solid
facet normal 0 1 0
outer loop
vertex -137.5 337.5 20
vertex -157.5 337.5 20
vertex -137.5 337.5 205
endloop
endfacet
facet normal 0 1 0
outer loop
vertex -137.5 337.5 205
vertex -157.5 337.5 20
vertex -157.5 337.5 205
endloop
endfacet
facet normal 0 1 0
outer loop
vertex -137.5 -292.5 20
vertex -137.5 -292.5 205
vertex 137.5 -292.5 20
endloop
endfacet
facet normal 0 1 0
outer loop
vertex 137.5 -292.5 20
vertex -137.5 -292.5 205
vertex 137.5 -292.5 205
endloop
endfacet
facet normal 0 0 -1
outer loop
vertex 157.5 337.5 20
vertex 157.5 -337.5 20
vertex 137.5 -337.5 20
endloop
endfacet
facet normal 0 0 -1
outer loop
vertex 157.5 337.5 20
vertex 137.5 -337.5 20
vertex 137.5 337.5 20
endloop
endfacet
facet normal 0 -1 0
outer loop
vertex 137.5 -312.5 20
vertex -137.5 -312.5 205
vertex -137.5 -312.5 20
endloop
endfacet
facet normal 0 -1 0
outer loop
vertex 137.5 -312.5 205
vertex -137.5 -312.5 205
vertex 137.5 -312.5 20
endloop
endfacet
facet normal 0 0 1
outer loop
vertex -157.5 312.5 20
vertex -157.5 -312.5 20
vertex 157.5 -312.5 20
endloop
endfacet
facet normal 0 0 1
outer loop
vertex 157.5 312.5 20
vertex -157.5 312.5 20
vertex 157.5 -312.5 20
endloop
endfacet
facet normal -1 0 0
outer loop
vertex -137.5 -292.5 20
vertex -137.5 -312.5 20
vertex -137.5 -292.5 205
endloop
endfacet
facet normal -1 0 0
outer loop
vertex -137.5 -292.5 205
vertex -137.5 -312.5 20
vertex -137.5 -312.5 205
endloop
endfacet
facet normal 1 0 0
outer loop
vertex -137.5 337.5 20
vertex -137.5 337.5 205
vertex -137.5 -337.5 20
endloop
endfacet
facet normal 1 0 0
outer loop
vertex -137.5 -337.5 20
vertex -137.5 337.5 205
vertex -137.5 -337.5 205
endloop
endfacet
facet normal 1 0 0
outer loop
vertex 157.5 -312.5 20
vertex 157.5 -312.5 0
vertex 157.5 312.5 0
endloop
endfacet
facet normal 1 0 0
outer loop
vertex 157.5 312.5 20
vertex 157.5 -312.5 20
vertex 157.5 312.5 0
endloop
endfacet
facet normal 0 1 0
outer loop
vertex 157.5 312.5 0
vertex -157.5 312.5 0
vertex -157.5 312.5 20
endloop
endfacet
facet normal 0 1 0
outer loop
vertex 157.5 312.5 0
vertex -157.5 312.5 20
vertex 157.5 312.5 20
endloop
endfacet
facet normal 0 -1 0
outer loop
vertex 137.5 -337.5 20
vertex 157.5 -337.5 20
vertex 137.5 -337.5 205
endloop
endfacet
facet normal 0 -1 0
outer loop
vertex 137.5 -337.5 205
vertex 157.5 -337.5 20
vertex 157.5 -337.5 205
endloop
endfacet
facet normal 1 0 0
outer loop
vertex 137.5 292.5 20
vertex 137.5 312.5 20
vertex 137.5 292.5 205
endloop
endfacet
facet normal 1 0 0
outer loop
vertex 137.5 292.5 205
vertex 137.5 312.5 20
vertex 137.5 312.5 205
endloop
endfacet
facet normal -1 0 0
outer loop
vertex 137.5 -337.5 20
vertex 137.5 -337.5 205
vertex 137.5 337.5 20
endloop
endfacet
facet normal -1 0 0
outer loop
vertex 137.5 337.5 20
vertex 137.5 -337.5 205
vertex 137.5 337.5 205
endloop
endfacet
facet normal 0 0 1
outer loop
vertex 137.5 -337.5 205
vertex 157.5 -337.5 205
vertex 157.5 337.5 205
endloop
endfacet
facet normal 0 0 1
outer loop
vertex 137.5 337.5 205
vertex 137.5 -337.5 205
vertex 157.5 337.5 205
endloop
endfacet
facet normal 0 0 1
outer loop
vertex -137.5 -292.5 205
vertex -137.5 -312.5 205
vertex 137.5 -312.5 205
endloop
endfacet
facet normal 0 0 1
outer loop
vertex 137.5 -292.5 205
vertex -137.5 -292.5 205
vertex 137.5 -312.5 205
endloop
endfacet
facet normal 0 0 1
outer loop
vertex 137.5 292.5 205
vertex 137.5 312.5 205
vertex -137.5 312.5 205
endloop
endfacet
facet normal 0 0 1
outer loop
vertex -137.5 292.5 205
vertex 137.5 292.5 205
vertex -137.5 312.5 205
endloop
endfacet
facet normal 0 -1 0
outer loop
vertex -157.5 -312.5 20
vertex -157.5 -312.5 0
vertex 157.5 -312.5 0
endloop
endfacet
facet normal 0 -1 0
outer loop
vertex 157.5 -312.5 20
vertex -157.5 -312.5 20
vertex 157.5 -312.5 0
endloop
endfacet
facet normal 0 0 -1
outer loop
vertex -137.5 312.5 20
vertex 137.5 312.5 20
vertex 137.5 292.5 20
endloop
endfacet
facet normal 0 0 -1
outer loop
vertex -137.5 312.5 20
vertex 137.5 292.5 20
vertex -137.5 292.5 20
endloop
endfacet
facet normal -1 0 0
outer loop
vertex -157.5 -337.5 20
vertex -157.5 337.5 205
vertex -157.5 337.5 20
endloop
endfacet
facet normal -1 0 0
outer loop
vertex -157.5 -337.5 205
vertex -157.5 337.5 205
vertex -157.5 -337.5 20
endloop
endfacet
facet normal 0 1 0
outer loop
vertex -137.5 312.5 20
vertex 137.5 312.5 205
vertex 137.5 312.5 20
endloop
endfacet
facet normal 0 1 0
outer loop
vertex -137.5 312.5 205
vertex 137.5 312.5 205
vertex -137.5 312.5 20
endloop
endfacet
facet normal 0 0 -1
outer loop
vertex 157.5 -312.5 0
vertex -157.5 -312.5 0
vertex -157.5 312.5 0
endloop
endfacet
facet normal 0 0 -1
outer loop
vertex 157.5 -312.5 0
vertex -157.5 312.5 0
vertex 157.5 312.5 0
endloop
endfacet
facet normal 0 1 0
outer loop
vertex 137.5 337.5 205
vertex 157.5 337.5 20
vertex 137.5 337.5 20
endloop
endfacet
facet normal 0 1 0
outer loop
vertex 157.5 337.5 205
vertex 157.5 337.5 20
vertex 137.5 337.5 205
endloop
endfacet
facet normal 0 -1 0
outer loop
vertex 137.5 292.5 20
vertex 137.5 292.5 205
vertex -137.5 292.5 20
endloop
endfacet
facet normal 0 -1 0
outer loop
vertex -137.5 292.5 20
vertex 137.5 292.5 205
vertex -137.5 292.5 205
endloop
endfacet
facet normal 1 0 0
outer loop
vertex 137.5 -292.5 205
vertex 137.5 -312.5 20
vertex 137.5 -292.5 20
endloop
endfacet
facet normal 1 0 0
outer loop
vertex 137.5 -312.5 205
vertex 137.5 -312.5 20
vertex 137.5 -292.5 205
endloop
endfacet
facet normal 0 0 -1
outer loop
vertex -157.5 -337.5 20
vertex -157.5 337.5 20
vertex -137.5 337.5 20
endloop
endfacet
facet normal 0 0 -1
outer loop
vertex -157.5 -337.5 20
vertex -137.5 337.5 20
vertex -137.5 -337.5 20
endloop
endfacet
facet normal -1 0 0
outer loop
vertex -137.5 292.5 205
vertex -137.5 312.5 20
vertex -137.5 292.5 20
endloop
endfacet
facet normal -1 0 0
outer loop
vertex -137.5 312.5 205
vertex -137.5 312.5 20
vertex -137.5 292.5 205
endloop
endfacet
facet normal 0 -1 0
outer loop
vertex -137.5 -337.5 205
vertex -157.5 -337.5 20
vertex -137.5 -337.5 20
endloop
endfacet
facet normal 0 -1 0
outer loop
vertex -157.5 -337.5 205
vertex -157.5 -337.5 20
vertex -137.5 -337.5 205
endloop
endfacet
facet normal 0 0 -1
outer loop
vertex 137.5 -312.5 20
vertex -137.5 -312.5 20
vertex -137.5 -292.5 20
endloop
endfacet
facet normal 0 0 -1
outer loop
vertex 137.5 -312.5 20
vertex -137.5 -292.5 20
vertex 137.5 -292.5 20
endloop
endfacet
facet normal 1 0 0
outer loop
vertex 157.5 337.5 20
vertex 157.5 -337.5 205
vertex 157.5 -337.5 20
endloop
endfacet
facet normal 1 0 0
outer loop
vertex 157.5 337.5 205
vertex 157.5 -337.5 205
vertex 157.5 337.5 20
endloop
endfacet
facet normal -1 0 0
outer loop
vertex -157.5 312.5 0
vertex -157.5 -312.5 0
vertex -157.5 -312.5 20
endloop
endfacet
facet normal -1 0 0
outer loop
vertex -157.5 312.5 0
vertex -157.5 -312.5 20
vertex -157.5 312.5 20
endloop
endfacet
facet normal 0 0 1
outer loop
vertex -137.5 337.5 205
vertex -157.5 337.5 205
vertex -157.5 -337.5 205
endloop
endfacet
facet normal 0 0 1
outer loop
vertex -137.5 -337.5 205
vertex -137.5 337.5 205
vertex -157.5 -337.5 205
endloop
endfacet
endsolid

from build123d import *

# Parameters (mm, degrees)
F0_W     = 315
F0_H     = 625
F1_DEPTH = 20
F2_W     = 675
F2_H     = 185
F3_DEPTH = 20
F4_W     = 675
F4_H     = 185
F5_DEPTH = 20
F6_W     = 275
F6_H     = 185
F7_DEPTH = 20
F8_W     = 275
F8_H     = 185
F9_DEPTH = 20


with BuildPart() as f1:
    # F0 (on Top) → F1 (new body)
    with BuildSketch(Plane.XY):
        Rectangle(F0_W, F0_H)
    extrude(amount=F1_DEPTH)


with BuildPart() as f3:
    # F2 (on face) → F3 (new body)
    with BuildSketch(Plane.YZ.offset(157.5)):
        with Locations((0, 112.5)):
            Rectangle(F2_W, F2_H)
    extrude(amount=-F3_DEPTH)


with BuildPart() as f5:
    # F4 (on face) → F5 (new body)
    with BuildSketch(Plane(origin=(-157.5, 0, 0), x_dir=(0, -1, 0), z_dir=(-1, 0, 0))):
        with Locations((0, 112.5)):
            Rectangle(F4_W, F4_H)
    extrude(amount=-F5_DEPTH)


with BuildPart() as f7:
    # F6 (on face) → F7 (new body)
    with BuildSketch(Plane(origin=(0, 312.5, 0), x_dir=(-1, 0, 0), z_dir=(0, 1, 0))):
        with Locations((0, 112.5)):
            Rectangle(F6_W, F6_H)
    extrude(amount=-F7_DEPTH)


with BuildPart() as f9:
    # F8 (on face) → F9 (new body)
    with BuildSketch(Plane.XZ.offset(312.5)):
        with Locations((0, 112.5)):
            Rectangle(F8_W, F8_H)
    extrude(amount=-F9_DEPTH)


solid = Compound([f1.part, f3.part, f5.part, f7.part, f9.part])
